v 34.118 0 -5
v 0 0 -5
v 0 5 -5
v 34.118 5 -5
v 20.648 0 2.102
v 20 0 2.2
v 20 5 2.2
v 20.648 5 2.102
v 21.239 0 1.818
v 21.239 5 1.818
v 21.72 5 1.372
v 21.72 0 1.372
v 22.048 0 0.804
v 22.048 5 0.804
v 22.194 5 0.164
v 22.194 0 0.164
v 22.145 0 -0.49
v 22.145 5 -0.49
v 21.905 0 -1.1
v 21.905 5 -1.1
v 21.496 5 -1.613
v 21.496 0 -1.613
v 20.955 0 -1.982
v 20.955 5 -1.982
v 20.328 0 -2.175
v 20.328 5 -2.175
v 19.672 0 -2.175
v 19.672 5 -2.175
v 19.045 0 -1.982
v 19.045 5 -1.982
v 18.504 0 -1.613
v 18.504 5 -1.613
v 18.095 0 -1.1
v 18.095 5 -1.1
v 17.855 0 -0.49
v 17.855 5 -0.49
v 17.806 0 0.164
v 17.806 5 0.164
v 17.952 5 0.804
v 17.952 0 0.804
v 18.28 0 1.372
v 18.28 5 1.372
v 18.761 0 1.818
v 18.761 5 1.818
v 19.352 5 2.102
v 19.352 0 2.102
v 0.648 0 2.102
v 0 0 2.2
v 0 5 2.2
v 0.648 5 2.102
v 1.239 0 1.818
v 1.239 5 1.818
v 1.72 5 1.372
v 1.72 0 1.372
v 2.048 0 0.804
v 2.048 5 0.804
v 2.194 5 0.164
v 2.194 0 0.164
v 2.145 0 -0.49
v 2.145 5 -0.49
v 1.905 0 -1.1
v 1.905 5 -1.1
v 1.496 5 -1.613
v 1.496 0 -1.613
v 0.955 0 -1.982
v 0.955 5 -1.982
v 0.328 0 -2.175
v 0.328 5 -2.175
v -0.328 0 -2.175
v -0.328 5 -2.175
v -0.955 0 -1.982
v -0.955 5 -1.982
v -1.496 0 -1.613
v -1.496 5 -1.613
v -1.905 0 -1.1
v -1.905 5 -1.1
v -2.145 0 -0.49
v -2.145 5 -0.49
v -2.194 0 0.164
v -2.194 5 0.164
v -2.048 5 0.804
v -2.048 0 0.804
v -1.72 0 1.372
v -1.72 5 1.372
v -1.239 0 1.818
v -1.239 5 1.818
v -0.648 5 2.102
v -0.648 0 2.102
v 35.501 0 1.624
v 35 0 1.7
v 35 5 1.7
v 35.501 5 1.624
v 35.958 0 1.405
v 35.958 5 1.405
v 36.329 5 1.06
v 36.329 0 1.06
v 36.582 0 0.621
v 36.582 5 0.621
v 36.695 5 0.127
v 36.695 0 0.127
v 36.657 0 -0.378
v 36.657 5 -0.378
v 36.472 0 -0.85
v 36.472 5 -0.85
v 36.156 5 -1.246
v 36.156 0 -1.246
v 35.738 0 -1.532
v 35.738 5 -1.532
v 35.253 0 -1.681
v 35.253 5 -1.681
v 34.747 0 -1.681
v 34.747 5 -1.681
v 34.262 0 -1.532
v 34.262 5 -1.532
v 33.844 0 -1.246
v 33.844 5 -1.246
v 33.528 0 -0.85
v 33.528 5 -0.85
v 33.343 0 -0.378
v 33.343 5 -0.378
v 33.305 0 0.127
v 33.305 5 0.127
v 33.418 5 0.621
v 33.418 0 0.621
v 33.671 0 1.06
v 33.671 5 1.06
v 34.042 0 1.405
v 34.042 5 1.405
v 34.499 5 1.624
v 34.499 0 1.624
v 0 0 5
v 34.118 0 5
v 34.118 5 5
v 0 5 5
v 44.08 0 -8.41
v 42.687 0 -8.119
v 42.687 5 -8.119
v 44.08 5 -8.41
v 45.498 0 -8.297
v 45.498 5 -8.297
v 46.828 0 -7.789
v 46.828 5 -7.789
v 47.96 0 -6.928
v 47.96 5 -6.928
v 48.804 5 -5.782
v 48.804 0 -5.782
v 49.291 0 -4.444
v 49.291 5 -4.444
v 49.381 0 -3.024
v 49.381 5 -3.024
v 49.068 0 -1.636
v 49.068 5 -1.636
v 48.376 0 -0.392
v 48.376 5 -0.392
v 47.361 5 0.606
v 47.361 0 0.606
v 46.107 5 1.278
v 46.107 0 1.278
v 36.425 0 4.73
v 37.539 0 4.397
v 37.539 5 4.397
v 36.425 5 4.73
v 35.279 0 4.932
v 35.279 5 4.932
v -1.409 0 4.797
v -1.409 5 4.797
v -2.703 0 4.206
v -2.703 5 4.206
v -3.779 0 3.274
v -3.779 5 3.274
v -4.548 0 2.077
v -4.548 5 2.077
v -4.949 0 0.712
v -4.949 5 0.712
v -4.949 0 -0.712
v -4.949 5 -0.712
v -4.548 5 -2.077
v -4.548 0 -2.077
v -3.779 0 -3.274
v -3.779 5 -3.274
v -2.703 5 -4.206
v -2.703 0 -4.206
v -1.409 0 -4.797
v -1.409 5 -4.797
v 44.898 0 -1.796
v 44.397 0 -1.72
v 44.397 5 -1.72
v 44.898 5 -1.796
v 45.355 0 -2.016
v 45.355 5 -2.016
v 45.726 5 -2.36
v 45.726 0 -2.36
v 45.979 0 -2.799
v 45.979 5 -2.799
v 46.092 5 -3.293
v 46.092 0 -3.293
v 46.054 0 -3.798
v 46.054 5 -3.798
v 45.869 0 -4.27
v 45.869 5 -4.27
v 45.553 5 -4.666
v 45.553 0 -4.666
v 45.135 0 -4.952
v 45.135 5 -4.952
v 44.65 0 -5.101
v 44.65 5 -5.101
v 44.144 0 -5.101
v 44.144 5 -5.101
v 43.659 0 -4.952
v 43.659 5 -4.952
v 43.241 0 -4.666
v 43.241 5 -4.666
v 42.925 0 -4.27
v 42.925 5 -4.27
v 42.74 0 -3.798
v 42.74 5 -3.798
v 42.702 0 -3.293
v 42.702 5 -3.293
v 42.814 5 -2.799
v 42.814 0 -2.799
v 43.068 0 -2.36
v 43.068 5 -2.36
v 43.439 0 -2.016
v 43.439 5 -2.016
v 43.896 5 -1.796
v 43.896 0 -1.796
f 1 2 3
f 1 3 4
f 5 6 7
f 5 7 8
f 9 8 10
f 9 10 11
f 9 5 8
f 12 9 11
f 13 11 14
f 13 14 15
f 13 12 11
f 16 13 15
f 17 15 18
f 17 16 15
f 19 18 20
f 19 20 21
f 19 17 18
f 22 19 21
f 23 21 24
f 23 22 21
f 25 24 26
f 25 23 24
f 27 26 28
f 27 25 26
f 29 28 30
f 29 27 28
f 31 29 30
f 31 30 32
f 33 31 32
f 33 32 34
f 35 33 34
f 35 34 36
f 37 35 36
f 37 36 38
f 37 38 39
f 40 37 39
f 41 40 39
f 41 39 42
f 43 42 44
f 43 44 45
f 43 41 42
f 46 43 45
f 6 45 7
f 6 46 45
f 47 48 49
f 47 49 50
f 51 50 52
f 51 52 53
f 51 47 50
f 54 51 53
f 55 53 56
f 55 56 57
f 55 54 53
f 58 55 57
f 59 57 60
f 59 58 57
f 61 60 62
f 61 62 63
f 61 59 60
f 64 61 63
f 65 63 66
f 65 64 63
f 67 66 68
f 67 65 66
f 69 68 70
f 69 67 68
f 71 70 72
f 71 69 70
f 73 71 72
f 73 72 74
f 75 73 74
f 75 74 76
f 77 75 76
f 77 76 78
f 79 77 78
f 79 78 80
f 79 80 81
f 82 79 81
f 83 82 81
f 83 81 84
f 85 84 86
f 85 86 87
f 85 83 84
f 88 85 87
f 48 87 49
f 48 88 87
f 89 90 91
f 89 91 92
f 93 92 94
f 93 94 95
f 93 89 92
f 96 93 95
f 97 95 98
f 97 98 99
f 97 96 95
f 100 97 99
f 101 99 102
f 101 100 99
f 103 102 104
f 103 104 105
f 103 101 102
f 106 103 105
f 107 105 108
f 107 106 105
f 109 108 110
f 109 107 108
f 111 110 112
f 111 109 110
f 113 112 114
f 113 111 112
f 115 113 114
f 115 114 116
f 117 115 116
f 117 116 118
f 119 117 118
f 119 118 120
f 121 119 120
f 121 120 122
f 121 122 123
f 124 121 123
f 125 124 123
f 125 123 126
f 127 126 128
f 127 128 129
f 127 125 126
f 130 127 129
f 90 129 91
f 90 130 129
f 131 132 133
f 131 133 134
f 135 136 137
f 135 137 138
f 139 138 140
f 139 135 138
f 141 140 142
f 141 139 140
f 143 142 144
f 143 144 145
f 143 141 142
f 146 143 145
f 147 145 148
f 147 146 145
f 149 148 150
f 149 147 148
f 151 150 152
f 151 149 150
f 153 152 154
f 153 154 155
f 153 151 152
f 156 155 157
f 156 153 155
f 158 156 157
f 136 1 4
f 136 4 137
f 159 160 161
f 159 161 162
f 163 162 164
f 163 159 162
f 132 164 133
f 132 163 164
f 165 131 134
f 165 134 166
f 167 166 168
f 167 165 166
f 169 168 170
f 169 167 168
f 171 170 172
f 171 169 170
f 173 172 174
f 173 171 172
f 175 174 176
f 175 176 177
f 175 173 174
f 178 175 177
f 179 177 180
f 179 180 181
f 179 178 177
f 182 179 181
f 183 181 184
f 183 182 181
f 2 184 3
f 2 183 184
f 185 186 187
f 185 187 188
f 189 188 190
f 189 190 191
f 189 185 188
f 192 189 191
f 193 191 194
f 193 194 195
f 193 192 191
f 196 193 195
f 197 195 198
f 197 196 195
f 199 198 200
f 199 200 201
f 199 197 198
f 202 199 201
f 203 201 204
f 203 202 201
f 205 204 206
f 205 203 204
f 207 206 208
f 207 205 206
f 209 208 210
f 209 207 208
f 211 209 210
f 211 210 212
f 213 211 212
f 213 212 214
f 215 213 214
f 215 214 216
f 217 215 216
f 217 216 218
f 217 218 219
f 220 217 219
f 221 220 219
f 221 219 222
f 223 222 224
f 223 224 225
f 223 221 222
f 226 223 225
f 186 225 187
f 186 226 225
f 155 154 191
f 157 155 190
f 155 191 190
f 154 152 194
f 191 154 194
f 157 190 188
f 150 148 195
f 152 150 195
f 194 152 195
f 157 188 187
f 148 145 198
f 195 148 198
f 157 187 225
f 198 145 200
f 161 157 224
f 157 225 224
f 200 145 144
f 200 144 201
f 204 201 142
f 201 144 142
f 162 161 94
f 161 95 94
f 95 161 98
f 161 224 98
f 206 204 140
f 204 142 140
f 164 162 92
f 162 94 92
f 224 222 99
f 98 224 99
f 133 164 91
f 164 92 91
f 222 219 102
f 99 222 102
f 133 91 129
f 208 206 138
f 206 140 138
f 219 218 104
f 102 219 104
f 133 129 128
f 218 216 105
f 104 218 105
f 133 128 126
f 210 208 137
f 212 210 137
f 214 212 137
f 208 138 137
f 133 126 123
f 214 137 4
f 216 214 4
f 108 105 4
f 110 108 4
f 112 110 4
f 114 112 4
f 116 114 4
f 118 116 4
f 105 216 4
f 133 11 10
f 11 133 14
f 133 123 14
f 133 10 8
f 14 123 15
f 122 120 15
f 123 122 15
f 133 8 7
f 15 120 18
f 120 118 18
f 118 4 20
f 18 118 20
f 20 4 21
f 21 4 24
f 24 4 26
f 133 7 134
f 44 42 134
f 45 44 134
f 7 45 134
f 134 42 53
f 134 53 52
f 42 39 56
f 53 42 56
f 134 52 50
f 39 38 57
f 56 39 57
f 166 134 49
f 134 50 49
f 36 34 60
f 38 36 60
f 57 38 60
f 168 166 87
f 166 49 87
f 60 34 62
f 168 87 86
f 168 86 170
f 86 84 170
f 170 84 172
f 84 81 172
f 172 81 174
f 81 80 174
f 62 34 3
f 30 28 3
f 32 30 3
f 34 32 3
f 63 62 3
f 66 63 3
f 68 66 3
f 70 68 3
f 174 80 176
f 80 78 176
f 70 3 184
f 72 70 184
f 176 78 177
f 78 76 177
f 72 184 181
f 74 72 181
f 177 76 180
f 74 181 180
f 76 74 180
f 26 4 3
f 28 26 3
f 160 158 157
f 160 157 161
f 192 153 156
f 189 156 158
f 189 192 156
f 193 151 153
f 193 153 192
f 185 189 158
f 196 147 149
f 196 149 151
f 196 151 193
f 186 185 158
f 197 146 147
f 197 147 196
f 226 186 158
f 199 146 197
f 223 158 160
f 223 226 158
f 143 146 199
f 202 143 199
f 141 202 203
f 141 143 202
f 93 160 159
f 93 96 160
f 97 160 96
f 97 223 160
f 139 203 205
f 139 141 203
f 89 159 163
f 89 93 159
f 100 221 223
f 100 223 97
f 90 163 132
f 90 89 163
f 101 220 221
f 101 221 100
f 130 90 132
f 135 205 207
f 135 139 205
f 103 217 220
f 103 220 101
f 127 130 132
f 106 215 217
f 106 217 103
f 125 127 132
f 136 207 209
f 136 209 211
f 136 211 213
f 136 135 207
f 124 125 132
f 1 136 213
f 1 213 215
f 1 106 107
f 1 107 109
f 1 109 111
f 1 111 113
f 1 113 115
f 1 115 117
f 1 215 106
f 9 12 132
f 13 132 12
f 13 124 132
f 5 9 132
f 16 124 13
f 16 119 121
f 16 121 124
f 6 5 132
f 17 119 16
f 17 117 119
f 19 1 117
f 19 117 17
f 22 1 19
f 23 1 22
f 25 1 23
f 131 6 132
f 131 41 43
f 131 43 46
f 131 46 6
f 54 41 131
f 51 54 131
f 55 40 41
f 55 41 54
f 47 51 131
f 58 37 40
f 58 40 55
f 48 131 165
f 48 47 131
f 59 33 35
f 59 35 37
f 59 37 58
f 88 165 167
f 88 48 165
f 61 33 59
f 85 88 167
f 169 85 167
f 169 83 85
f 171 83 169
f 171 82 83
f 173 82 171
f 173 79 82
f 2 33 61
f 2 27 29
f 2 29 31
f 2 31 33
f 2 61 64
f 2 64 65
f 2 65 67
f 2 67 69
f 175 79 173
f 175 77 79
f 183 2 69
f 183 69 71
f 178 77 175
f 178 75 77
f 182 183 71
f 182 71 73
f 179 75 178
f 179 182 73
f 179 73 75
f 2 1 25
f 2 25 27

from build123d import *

# Parameters (mm, degrees)
SKETCH_1_R      = 2.2
SKETCH_1_R_2    = 1.7
EXTRUDE_1_DEPTH = 5


with BuildPart() as part:
    # 草图1 → 凸台-拉伸1 (new body)
    with BuildSketch(Plane(origin=(0, 0, 0), x_dir=(1, 0, 0), z_dir=(0, 1, 0))):
        with BuildLine():
            Line((0, 5), (34.118365096, 5))
            Line((34.118365096, 5), (42.686825491, 8.118664537))
            ThreePointArc((42.686825491, 8.118664537), (49.095389312, 5.13030215), (46.107026924, -1.278261671))
            Line((46.107026924, -1.278261671), (37.53856653, -4.396926208))
            ThreePointArc((37.53856653, -4.396926208), (35.854846873, -4.84807753), (34.118365096, -5))
            Line((34.118365096, -5), (0, -5))
            ThreePointArc((0, -5), (-5, 0), (0, 5))
        make_face()
        with Locations(Location((0, 0, 0), (0, 0, 270))):
            Circle(SKETCH_1_R, mode=Mode.SUBTRACT)
        with Locations(Location((20, 0, 0), (0, 0, 270))):
            Circle(SKETCH_1_R, mode=Mode.SUBTRACT)
        with Locations(Location((35, 0, 0), (0, 0, 270))):
            Circle(SKETCH_1_R_2, mode=Mode.SUBTRACT)
        with Locations(Location((44.396926208, 3.420201433, 0), (0, 0, 270))):
            Circle(SKETCH_1_R_2, mode=Mode.SUBTRACT)
    extrude(amount=EXTRUDE_1_DEPTH)


solid = part.part
